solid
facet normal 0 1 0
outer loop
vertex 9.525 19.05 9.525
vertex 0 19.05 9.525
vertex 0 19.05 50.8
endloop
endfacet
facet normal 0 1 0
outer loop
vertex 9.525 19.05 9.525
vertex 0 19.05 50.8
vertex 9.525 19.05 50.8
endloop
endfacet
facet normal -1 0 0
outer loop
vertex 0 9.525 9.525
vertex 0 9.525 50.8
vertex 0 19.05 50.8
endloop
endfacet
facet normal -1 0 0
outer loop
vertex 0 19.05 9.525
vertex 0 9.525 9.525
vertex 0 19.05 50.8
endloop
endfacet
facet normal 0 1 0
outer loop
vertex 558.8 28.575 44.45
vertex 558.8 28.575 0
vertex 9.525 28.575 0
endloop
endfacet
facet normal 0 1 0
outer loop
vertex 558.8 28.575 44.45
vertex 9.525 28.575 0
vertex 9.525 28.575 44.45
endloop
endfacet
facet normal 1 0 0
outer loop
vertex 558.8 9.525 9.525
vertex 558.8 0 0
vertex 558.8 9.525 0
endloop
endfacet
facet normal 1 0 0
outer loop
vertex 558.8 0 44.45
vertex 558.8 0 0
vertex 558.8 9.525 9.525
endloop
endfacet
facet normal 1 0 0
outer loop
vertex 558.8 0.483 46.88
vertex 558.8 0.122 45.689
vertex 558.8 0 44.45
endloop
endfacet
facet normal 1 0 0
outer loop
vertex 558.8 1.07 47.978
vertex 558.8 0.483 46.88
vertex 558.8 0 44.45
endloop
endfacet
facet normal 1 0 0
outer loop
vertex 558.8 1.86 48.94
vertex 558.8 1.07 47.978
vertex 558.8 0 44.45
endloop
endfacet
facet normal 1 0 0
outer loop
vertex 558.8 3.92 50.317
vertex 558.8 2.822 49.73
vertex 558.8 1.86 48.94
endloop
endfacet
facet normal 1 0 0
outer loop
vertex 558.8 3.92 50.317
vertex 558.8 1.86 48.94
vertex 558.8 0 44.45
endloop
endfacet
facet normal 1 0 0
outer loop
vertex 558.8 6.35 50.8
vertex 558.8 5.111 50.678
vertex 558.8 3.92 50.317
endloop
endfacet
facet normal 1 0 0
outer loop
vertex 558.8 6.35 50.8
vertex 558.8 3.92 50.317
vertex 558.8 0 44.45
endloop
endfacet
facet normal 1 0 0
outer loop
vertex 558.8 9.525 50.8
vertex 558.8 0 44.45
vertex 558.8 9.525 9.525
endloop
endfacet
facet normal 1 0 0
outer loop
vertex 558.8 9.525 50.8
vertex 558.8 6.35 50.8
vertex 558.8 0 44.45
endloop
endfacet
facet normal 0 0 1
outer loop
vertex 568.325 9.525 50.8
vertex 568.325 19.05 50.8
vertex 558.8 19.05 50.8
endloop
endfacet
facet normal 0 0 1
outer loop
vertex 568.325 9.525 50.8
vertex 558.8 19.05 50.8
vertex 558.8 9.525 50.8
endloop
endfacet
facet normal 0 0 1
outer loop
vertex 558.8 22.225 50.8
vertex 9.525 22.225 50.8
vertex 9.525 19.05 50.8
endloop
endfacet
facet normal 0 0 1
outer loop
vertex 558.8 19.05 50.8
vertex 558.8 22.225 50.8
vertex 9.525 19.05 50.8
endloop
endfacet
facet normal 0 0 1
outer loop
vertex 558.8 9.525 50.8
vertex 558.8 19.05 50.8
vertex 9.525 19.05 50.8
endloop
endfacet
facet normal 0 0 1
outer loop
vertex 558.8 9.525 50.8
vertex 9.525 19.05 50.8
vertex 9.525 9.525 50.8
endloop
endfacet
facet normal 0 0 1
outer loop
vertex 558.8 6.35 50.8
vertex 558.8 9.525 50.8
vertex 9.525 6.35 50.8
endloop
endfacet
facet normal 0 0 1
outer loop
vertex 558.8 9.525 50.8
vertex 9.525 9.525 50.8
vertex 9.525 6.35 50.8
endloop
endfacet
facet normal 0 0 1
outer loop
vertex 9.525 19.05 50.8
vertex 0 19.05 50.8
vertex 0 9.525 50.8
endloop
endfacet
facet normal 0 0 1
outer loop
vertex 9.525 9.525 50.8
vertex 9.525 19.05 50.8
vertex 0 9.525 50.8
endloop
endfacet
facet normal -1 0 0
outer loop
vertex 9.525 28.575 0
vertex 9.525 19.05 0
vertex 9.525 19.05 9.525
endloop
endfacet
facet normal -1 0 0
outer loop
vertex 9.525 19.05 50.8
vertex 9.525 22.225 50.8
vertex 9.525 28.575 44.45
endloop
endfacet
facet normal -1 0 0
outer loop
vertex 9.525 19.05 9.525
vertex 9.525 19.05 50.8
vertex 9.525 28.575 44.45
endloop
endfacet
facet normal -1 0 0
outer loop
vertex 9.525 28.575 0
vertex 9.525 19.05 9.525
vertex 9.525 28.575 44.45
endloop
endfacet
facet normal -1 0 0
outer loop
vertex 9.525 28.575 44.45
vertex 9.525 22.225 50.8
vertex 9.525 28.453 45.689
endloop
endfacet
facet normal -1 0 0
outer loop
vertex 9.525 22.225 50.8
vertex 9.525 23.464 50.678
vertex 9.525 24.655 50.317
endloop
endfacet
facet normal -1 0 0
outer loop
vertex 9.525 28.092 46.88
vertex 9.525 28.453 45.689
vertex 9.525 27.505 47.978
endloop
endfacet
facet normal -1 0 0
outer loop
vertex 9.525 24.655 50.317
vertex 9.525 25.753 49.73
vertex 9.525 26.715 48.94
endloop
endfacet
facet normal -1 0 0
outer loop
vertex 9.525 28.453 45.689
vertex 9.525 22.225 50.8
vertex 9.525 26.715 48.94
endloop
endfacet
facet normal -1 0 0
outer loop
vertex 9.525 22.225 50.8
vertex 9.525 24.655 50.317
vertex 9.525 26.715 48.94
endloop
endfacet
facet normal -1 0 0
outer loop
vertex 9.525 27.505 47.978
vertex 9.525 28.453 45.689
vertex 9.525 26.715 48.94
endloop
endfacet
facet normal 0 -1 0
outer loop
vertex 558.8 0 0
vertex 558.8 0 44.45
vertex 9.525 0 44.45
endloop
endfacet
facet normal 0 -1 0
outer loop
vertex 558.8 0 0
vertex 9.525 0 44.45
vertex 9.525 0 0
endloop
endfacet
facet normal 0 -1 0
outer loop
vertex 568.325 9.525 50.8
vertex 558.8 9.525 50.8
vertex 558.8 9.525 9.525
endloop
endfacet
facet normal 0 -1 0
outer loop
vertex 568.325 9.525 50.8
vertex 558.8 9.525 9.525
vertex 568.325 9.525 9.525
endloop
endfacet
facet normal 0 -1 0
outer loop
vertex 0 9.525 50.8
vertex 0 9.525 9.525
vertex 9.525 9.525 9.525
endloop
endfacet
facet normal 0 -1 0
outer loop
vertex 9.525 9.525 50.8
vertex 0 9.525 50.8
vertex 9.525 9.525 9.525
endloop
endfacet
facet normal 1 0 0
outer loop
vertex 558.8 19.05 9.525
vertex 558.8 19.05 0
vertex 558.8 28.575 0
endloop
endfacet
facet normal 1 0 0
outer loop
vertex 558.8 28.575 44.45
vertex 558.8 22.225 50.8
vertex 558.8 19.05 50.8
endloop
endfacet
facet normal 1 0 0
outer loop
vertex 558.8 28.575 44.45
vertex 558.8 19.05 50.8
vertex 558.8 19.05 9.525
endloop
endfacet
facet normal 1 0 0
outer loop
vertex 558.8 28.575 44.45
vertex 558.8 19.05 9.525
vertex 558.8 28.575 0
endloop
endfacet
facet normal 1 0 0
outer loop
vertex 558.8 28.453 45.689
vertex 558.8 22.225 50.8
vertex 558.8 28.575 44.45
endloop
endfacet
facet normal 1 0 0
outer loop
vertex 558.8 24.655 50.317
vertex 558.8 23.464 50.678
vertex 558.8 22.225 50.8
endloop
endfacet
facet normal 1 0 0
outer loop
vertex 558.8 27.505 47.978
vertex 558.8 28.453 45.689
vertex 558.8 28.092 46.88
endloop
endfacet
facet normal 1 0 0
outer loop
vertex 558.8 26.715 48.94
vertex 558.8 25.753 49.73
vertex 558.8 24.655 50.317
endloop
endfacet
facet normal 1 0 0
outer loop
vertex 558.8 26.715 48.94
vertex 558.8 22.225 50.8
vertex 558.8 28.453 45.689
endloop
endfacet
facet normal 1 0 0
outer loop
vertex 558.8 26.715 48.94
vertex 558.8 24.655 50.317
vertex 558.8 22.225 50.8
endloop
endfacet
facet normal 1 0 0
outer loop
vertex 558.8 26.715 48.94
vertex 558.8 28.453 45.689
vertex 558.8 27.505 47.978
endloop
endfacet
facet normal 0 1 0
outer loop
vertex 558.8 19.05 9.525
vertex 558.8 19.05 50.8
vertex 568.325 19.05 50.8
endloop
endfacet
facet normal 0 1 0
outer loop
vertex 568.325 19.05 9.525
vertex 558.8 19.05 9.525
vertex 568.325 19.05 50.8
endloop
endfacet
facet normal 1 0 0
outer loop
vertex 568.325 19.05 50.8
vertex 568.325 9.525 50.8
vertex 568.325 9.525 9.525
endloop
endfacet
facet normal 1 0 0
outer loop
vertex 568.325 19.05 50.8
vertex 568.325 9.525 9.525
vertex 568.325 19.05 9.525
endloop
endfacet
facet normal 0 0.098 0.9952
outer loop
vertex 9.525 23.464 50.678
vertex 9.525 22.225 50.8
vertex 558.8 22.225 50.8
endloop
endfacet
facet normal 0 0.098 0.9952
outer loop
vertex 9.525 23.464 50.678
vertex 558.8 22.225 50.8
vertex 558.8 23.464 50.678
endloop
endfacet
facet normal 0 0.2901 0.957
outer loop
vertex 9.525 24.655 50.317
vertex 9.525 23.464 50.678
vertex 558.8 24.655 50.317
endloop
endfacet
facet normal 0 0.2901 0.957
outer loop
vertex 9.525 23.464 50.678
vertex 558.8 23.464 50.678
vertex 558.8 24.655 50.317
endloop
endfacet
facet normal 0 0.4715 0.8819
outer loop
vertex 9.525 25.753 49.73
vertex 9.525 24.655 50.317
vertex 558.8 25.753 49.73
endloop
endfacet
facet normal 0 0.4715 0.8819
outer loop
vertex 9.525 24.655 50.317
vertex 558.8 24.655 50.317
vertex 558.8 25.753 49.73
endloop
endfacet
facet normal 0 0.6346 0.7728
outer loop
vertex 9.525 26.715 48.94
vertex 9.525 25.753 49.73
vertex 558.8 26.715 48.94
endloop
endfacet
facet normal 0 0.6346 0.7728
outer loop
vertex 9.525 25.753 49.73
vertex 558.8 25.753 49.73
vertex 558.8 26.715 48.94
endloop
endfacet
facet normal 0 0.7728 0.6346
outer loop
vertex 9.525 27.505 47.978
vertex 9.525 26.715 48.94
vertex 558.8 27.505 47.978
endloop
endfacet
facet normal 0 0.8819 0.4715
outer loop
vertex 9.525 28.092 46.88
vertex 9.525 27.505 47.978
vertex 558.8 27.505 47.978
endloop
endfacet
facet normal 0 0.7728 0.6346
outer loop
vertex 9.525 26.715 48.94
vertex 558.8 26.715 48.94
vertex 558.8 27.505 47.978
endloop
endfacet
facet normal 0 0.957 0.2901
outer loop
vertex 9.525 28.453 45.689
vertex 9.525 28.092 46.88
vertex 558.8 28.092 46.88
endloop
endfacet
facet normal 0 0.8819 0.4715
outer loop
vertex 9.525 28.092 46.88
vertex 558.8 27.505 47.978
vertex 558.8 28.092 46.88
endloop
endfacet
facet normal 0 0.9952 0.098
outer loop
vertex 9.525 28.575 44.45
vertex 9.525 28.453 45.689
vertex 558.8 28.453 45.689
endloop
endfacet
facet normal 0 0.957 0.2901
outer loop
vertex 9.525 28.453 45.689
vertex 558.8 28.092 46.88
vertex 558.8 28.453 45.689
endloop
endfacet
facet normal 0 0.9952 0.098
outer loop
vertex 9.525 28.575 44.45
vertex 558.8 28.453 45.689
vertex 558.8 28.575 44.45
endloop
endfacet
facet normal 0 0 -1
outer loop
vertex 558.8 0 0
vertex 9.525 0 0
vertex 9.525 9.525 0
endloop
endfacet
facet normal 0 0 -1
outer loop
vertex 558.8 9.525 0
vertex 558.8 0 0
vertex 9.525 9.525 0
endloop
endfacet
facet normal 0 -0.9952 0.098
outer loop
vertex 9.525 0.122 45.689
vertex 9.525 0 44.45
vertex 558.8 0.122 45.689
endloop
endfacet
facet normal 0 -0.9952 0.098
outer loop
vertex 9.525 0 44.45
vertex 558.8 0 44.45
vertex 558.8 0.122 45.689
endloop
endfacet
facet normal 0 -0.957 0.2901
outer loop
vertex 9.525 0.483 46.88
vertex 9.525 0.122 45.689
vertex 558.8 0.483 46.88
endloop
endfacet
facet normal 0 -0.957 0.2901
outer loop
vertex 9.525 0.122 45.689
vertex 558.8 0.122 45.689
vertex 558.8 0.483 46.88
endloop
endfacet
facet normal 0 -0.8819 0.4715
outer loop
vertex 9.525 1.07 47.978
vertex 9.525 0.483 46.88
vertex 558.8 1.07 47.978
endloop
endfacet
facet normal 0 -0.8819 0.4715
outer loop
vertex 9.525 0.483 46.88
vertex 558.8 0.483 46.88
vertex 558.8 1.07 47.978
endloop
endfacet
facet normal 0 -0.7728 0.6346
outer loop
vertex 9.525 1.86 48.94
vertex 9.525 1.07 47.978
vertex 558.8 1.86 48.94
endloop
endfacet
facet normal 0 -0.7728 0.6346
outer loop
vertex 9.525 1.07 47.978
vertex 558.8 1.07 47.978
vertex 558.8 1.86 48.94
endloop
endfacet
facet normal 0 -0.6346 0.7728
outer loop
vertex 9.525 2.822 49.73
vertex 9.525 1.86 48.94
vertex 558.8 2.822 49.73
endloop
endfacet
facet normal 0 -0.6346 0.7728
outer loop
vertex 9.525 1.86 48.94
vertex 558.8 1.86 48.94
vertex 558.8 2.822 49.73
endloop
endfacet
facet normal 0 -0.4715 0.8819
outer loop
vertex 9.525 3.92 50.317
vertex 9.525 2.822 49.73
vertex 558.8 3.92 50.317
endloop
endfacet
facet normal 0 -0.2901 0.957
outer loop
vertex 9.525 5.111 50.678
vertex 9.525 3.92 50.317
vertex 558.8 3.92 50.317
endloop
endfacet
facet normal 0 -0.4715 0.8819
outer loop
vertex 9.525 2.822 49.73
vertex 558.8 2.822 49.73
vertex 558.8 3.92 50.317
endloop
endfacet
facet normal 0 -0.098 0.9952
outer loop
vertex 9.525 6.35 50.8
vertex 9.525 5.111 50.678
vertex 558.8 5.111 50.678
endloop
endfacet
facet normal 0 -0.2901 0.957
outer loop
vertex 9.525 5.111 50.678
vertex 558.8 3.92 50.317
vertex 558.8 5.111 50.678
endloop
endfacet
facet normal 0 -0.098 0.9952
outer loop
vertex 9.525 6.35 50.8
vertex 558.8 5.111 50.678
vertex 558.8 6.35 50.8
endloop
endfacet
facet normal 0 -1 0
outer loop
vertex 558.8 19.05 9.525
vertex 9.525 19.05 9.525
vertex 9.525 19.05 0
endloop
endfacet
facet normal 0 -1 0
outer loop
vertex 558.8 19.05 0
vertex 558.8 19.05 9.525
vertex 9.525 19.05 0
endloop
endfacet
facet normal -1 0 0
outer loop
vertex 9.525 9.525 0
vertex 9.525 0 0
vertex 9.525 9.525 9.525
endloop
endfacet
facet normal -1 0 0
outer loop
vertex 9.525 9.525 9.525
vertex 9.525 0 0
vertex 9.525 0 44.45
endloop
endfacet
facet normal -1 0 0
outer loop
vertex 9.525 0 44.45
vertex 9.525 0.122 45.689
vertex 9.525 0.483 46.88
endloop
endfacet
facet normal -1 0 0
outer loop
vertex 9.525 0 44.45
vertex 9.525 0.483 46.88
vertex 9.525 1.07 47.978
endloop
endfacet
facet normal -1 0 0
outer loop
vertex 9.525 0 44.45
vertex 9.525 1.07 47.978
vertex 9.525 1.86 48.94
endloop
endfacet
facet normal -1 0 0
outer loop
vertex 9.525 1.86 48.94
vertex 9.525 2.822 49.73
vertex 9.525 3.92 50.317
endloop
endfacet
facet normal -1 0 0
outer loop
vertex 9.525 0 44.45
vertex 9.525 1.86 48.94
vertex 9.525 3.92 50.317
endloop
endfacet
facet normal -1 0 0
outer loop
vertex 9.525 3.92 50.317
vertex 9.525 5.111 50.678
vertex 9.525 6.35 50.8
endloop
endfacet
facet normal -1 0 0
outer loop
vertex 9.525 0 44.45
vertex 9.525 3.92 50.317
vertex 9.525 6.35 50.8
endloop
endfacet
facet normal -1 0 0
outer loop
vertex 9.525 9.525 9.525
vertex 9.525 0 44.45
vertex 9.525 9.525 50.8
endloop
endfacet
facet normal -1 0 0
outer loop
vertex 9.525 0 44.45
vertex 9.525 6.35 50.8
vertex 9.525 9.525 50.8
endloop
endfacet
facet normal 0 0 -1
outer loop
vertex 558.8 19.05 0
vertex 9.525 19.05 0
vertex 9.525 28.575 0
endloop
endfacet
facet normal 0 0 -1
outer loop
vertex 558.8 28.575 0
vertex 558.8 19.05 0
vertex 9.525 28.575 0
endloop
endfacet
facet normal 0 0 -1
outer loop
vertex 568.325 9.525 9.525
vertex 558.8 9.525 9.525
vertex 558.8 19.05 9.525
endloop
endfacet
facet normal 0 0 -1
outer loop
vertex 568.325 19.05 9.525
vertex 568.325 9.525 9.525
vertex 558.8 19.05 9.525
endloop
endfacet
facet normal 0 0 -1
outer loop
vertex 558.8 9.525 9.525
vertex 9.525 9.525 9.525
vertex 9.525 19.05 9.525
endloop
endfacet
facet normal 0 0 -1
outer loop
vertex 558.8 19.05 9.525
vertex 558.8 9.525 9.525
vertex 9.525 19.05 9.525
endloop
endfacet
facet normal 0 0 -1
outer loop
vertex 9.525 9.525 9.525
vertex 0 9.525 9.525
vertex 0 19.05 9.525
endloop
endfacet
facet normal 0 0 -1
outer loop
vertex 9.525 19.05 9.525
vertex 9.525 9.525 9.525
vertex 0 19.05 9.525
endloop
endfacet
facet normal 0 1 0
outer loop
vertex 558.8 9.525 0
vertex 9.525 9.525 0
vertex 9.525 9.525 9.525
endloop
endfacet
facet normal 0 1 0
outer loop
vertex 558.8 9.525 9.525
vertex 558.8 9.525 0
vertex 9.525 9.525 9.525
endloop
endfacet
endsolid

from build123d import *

# Parameters (mm, degrees)
F1_DEPTH = 568.325
F2_W     = 9.525
F2_H     = 9.525
F3_DEPTH = 50.8
F4_R     = 6.35


with BuildPart() as f1:
    # F0 (on Right) → F1 (new body)
    with BuildSketch(Plane.YZ):
        Polygon((0, 50.8), (0, 0), (9.525, 0), (9.525, 9.525), (19.05, 9.525), (19.05, 0), (28.575, 0), (28.575, 50.8), align=None)
    extrude(amount=F1_DEPTH)

    # F2 (on face) → F3 (cut)
    with BuildSketch(Plane.XY.offset(50.8)):
        with Locations((4.7625, 23.8125)):
            Rectangle(F2_W, F2_H)
        with Locations((4.7625, 4.7625)):
            Rectangle(F2_W, F2_H)
        with Locations((563.5625, 23.8125)):
            Rectangle(F2_W, F2_H)
        with Locations((563.5625, 4.7625)):
            Rectangle(F2_W, F2_H)
    extrude(amount=-F3_DEPTH, mode=Mode.SUBTRACT)

    # F4
    f4_edges = [f1.edges().sort_by_distance(p)[0] for p in [
        (284.1625, 0, 50.8),
        (284.1625, 28.575, 50.8),
    ]]
    fillet(f4_edges, radius=F4_R)


solid = f1.part
